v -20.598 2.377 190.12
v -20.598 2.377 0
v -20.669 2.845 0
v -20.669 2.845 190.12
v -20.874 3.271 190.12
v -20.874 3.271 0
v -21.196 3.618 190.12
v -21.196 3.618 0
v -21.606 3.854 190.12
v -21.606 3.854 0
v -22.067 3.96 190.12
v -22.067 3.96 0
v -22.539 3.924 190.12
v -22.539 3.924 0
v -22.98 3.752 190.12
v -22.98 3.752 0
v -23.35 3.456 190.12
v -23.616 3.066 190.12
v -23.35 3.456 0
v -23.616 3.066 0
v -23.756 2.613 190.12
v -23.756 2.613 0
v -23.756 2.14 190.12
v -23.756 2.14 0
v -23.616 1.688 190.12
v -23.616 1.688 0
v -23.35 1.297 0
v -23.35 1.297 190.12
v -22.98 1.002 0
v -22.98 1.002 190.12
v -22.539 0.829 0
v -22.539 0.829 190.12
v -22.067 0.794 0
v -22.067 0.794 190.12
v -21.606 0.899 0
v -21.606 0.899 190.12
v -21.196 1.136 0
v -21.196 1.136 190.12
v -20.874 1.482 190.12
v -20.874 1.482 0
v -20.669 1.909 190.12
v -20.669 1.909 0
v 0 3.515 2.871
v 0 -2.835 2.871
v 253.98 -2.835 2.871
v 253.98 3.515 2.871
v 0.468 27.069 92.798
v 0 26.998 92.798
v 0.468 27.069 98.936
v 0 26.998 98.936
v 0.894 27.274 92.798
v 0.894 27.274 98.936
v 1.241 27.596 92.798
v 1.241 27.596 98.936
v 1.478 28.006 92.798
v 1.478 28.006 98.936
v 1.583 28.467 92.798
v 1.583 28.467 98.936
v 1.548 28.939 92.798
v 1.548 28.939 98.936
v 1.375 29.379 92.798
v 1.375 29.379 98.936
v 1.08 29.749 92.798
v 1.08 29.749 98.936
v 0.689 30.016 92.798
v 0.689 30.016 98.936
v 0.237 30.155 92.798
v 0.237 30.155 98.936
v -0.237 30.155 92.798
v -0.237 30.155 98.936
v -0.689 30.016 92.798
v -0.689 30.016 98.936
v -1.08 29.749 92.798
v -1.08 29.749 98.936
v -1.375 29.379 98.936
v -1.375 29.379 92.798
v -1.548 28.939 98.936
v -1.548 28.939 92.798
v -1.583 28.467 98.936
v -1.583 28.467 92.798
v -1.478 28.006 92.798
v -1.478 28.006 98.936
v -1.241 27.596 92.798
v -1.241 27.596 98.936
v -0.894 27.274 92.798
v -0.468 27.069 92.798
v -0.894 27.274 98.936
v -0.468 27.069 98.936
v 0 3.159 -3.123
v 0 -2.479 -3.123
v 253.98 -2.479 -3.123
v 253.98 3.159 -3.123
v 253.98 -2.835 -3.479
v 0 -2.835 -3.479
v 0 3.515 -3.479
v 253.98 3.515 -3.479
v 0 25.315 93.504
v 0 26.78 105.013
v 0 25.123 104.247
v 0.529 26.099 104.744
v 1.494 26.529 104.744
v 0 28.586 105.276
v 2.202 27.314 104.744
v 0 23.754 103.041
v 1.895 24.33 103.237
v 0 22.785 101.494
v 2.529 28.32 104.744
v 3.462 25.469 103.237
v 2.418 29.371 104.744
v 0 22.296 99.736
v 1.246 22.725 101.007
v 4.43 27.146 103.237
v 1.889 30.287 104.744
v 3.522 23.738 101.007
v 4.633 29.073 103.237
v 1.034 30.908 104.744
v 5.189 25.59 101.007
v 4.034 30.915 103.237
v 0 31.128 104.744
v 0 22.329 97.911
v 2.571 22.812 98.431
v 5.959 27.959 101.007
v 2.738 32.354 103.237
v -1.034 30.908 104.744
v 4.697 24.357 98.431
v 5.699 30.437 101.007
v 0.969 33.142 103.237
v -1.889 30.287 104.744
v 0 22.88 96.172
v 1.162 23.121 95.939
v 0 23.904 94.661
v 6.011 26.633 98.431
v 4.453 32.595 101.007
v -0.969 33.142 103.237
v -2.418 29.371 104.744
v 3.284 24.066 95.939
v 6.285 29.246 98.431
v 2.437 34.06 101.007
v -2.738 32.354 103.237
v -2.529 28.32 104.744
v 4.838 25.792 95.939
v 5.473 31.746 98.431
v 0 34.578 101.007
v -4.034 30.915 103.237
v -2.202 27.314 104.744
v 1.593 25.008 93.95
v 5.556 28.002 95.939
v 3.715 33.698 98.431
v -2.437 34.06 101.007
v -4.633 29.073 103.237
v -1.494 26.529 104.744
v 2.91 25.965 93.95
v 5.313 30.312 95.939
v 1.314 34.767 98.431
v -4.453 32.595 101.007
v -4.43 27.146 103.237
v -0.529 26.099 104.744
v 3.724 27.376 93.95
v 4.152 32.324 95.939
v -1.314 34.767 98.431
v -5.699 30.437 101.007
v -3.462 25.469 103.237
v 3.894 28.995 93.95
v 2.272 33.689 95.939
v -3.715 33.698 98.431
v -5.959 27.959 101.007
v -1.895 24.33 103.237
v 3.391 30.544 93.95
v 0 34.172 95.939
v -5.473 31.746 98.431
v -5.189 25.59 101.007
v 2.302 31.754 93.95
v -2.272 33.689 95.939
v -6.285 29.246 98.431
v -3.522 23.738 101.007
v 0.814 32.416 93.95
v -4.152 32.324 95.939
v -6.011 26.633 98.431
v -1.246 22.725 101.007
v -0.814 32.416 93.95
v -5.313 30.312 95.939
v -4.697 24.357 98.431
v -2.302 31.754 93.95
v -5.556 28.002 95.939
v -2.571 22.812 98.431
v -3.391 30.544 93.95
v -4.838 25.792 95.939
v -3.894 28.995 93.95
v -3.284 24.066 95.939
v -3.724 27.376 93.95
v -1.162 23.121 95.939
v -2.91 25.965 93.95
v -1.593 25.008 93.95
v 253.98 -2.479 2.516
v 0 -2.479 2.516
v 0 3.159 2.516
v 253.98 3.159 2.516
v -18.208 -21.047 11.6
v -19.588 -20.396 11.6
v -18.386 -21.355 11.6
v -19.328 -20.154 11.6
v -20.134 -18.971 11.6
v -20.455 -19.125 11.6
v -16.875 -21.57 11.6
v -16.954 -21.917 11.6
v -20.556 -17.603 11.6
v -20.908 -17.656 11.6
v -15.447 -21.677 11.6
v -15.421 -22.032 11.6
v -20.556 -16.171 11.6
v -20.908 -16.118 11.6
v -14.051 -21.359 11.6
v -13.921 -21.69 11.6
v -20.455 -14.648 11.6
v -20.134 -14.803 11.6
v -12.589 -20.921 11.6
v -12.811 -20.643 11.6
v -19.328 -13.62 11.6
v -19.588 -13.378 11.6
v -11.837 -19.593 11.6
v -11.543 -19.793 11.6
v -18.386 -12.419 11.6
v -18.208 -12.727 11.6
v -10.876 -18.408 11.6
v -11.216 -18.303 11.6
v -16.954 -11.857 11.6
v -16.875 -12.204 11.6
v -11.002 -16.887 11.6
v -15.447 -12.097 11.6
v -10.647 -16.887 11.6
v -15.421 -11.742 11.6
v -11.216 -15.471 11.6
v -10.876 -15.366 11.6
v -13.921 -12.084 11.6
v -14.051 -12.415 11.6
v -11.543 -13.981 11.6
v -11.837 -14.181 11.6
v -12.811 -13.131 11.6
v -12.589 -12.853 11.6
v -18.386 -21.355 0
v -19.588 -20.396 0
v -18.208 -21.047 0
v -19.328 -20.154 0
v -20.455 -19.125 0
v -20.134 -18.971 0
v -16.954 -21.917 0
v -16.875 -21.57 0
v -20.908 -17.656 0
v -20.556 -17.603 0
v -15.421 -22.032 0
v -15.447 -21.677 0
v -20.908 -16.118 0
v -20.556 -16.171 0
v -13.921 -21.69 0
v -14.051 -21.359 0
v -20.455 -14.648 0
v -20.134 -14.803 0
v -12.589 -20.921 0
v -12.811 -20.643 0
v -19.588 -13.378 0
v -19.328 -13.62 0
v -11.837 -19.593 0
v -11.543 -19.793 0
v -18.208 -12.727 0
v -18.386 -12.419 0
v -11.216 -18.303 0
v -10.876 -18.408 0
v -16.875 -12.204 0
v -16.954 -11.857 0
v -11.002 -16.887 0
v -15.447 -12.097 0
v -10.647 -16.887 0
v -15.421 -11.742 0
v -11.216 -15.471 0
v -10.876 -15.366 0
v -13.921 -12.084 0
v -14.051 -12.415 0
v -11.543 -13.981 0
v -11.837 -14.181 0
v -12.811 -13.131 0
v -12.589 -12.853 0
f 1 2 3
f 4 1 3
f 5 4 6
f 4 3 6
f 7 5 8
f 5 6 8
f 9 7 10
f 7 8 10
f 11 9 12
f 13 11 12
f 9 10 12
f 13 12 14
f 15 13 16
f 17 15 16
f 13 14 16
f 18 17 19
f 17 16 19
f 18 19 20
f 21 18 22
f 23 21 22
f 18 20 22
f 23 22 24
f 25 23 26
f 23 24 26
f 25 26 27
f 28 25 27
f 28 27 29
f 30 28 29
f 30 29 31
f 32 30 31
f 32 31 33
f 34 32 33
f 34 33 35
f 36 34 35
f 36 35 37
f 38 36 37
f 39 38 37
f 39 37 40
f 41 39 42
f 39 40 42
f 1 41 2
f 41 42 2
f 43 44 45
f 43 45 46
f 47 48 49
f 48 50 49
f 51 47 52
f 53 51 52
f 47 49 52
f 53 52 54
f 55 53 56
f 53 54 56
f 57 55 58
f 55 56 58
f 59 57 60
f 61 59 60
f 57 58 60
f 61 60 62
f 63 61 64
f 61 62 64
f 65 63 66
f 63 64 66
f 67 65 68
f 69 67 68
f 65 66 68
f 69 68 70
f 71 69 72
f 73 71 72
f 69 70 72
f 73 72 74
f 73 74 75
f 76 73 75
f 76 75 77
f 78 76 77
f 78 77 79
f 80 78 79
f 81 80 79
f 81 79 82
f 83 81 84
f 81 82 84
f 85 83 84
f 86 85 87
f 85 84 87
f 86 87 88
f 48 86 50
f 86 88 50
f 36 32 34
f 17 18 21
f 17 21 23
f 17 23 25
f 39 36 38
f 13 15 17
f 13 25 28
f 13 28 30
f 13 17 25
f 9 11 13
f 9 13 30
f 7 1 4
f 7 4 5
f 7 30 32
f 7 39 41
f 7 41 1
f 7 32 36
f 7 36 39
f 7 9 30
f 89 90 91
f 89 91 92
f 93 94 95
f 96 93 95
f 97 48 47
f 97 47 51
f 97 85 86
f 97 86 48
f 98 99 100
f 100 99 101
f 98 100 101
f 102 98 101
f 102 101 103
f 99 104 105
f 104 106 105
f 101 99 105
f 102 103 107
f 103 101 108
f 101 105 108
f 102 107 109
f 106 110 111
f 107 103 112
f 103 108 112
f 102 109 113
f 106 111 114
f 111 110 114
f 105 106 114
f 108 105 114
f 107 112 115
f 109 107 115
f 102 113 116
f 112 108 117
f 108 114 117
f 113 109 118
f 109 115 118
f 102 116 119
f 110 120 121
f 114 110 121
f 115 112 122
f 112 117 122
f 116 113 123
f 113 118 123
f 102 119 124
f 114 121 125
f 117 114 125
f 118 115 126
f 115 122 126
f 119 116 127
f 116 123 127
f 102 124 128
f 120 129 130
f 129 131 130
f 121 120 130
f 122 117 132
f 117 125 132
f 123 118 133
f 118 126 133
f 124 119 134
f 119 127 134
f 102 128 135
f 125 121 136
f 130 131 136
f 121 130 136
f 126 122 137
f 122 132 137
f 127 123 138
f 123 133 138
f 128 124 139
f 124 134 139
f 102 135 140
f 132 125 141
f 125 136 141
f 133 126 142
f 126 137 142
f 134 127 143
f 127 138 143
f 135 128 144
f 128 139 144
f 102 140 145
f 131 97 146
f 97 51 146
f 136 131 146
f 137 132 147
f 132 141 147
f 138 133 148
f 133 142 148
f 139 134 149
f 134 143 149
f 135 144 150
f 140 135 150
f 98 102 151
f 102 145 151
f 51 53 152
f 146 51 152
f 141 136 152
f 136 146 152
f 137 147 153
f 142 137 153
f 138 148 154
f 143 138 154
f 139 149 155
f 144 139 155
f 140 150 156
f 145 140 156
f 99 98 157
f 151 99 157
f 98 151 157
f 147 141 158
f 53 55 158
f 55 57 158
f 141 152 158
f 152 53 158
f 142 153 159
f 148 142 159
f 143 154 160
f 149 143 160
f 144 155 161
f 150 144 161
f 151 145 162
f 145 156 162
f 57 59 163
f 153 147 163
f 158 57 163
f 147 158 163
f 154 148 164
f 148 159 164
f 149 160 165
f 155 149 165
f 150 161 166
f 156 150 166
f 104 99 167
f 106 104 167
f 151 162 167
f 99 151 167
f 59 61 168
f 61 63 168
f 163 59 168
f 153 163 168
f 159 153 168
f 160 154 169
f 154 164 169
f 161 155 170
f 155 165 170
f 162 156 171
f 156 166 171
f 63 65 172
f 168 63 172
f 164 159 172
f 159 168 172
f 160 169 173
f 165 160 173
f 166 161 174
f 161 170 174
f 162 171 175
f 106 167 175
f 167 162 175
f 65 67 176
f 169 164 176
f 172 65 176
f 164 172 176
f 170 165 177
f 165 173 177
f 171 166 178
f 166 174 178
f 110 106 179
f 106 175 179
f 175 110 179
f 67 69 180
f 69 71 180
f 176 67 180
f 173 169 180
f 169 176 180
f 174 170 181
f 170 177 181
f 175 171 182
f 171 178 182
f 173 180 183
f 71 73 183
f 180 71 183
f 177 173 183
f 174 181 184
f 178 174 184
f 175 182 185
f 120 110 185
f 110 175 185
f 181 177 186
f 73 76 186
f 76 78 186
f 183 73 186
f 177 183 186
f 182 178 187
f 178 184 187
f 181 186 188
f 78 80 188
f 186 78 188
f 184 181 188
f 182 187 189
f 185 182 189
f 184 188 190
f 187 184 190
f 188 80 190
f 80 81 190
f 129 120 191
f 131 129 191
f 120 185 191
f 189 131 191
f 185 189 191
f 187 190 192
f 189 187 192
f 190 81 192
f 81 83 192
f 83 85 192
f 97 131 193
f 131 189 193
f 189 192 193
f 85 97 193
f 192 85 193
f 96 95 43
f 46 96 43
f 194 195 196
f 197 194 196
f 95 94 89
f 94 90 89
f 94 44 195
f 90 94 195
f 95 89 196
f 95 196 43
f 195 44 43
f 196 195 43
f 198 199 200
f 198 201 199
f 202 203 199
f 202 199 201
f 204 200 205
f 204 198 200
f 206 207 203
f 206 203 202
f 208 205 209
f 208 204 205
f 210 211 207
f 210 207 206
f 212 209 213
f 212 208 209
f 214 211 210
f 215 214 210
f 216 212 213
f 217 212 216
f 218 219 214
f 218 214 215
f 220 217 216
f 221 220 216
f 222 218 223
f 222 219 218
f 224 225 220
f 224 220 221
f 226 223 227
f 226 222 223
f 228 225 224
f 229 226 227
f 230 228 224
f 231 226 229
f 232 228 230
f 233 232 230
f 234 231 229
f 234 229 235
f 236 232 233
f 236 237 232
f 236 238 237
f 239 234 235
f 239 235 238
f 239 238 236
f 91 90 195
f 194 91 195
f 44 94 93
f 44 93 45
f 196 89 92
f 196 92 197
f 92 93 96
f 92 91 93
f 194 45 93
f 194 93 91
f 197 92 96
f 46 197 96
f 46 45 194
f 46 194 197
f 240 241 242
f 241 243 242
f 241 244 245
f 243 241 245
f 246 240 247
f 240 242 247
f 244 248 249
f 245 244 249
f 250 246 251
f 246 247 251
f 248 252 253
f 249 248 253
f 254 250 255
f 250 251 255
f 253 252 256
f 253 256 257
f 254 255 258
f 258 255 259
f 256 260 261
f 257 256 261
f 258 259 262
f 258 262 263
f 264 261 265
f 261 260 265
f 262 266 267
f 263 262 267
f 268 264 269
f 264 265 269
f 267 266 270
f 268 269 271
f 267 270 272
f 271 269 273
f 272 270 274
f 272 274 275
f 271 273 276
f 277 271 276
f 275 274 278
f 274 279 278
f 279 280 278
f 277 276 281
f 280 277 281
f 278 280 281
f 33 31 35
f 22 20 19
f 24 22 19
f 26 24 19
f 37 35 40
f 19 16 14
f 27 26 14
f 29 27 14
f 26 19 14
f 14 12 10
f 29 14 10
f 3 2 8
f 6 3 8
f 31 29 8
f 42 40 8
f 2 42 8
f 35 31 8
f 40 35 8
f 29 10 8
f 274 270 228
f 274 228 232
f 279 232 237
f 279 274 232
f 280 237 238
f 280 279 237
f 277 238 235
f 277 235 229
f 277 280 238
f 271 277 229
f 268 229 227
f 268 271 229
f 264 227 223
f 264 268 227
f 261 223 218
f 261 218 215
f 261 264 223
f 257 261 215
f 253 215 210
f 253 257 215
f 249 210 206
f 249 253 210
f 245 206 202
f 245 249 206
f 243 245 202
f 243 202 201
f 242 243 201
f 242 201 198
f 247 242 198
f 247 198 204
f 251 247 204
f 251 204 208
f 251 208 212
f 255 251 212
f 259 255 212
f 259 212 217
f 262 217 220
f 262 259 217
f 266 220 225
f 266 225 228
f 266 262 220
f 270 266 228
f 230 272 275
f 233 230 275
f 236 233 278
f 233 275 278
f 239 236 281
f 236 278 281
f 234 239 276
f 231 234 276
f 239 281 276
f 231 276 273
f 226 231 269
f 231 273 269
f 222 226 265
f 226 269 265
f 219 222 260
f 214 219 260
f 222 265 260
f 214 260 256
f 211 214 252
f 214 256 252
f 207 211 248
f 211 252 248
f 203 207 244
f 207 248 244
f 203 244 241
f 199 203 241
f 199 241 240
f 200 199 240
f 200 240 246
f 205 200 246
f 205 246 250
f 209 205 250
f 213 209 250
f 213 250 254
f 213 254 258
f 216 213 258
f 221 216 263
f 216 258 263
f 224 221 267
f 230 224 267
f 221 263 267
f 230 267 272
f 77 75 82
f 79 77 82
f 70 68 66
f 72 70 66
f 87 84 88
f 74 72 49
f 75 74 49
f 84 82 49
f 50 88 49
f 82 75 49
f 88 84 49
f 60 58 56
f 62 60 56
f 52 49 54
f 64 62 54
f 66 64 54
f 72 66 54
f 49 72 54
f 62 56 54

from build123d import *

# Parameters (mm, degrees)
F4_W     = 6.35
F4_H     = 6.35
F4_W_2   = 5.6388
F4_H_2   = 5.6388
F5_DEPTH = 253.98
F6_R     = 1.5875
F7_DEPTH = 190.12
F8_R     = 5.159375
F8_R_2   = 4.803775
F9_DEPTH = 11.6


with BuildPart() as f3:
    # F2 (on Right) → F3 (revolve)
    with BuildSketch(Plane.YZ):
        with BuildLine():
            Line((28.5856276751, 98.9358499646), (28.5856276751, 105.2758499646))
            ThreePointArc((28.5856276751, 105.2758499646), (22.2963222105, 99.7359979346), (26.9981276751, 92.7978174012))
            Line((26.9981276751, 92.7978174012), (26.9981276751, 98.9358499646))
            Line((26.9981276751, 98.9358499646), (28.5856276751, 98.9358499646))
        make_face()
    revolve(axis=Axis((0, 28.5856276751, 102.1058499646), (0, 0, 1)))


with BuildPart() as f5:
    # F4 (on Right) → F5 (new body)
    with BuildSketch(Plane.YZ):
        with Locations((0.3399441484, -0.3035154659)):
            Rectangle(F4_W, F4_H)
        with Locations((0.3399441484, -0.3035154659)):
            Rectangle(F4_W_2, F4_H_2, mode=Mode.SUBTRACT)
    extrude(amount=F5_DEPTH)


with BuildPart() as f7:
    # F6 (on Top) → F7 (new body)
    with BuildSketch(Plane.XY):
        with Locations((-22.1857912838, 2.3767193779)):
            Circle(F6_R)
    extrude(amount=F7_DEPTH)


with BuildPart() as f9:
    # F8 (on Top) → F9 (new body)
    with BuildSketch(Plane.XY):
        with Locations((-15.8061217517, -16.8869160116)):
            Circle(F8_R)
        with Locations((-15.8061217517, -16.8869160116)):
            Circle(F8_R_2, mode=Mode.SUBTRACT)
    extrude(amount=F9_DEPTH)


solid = Compound([f3.part, f5.part, f7.part, f9.part])
